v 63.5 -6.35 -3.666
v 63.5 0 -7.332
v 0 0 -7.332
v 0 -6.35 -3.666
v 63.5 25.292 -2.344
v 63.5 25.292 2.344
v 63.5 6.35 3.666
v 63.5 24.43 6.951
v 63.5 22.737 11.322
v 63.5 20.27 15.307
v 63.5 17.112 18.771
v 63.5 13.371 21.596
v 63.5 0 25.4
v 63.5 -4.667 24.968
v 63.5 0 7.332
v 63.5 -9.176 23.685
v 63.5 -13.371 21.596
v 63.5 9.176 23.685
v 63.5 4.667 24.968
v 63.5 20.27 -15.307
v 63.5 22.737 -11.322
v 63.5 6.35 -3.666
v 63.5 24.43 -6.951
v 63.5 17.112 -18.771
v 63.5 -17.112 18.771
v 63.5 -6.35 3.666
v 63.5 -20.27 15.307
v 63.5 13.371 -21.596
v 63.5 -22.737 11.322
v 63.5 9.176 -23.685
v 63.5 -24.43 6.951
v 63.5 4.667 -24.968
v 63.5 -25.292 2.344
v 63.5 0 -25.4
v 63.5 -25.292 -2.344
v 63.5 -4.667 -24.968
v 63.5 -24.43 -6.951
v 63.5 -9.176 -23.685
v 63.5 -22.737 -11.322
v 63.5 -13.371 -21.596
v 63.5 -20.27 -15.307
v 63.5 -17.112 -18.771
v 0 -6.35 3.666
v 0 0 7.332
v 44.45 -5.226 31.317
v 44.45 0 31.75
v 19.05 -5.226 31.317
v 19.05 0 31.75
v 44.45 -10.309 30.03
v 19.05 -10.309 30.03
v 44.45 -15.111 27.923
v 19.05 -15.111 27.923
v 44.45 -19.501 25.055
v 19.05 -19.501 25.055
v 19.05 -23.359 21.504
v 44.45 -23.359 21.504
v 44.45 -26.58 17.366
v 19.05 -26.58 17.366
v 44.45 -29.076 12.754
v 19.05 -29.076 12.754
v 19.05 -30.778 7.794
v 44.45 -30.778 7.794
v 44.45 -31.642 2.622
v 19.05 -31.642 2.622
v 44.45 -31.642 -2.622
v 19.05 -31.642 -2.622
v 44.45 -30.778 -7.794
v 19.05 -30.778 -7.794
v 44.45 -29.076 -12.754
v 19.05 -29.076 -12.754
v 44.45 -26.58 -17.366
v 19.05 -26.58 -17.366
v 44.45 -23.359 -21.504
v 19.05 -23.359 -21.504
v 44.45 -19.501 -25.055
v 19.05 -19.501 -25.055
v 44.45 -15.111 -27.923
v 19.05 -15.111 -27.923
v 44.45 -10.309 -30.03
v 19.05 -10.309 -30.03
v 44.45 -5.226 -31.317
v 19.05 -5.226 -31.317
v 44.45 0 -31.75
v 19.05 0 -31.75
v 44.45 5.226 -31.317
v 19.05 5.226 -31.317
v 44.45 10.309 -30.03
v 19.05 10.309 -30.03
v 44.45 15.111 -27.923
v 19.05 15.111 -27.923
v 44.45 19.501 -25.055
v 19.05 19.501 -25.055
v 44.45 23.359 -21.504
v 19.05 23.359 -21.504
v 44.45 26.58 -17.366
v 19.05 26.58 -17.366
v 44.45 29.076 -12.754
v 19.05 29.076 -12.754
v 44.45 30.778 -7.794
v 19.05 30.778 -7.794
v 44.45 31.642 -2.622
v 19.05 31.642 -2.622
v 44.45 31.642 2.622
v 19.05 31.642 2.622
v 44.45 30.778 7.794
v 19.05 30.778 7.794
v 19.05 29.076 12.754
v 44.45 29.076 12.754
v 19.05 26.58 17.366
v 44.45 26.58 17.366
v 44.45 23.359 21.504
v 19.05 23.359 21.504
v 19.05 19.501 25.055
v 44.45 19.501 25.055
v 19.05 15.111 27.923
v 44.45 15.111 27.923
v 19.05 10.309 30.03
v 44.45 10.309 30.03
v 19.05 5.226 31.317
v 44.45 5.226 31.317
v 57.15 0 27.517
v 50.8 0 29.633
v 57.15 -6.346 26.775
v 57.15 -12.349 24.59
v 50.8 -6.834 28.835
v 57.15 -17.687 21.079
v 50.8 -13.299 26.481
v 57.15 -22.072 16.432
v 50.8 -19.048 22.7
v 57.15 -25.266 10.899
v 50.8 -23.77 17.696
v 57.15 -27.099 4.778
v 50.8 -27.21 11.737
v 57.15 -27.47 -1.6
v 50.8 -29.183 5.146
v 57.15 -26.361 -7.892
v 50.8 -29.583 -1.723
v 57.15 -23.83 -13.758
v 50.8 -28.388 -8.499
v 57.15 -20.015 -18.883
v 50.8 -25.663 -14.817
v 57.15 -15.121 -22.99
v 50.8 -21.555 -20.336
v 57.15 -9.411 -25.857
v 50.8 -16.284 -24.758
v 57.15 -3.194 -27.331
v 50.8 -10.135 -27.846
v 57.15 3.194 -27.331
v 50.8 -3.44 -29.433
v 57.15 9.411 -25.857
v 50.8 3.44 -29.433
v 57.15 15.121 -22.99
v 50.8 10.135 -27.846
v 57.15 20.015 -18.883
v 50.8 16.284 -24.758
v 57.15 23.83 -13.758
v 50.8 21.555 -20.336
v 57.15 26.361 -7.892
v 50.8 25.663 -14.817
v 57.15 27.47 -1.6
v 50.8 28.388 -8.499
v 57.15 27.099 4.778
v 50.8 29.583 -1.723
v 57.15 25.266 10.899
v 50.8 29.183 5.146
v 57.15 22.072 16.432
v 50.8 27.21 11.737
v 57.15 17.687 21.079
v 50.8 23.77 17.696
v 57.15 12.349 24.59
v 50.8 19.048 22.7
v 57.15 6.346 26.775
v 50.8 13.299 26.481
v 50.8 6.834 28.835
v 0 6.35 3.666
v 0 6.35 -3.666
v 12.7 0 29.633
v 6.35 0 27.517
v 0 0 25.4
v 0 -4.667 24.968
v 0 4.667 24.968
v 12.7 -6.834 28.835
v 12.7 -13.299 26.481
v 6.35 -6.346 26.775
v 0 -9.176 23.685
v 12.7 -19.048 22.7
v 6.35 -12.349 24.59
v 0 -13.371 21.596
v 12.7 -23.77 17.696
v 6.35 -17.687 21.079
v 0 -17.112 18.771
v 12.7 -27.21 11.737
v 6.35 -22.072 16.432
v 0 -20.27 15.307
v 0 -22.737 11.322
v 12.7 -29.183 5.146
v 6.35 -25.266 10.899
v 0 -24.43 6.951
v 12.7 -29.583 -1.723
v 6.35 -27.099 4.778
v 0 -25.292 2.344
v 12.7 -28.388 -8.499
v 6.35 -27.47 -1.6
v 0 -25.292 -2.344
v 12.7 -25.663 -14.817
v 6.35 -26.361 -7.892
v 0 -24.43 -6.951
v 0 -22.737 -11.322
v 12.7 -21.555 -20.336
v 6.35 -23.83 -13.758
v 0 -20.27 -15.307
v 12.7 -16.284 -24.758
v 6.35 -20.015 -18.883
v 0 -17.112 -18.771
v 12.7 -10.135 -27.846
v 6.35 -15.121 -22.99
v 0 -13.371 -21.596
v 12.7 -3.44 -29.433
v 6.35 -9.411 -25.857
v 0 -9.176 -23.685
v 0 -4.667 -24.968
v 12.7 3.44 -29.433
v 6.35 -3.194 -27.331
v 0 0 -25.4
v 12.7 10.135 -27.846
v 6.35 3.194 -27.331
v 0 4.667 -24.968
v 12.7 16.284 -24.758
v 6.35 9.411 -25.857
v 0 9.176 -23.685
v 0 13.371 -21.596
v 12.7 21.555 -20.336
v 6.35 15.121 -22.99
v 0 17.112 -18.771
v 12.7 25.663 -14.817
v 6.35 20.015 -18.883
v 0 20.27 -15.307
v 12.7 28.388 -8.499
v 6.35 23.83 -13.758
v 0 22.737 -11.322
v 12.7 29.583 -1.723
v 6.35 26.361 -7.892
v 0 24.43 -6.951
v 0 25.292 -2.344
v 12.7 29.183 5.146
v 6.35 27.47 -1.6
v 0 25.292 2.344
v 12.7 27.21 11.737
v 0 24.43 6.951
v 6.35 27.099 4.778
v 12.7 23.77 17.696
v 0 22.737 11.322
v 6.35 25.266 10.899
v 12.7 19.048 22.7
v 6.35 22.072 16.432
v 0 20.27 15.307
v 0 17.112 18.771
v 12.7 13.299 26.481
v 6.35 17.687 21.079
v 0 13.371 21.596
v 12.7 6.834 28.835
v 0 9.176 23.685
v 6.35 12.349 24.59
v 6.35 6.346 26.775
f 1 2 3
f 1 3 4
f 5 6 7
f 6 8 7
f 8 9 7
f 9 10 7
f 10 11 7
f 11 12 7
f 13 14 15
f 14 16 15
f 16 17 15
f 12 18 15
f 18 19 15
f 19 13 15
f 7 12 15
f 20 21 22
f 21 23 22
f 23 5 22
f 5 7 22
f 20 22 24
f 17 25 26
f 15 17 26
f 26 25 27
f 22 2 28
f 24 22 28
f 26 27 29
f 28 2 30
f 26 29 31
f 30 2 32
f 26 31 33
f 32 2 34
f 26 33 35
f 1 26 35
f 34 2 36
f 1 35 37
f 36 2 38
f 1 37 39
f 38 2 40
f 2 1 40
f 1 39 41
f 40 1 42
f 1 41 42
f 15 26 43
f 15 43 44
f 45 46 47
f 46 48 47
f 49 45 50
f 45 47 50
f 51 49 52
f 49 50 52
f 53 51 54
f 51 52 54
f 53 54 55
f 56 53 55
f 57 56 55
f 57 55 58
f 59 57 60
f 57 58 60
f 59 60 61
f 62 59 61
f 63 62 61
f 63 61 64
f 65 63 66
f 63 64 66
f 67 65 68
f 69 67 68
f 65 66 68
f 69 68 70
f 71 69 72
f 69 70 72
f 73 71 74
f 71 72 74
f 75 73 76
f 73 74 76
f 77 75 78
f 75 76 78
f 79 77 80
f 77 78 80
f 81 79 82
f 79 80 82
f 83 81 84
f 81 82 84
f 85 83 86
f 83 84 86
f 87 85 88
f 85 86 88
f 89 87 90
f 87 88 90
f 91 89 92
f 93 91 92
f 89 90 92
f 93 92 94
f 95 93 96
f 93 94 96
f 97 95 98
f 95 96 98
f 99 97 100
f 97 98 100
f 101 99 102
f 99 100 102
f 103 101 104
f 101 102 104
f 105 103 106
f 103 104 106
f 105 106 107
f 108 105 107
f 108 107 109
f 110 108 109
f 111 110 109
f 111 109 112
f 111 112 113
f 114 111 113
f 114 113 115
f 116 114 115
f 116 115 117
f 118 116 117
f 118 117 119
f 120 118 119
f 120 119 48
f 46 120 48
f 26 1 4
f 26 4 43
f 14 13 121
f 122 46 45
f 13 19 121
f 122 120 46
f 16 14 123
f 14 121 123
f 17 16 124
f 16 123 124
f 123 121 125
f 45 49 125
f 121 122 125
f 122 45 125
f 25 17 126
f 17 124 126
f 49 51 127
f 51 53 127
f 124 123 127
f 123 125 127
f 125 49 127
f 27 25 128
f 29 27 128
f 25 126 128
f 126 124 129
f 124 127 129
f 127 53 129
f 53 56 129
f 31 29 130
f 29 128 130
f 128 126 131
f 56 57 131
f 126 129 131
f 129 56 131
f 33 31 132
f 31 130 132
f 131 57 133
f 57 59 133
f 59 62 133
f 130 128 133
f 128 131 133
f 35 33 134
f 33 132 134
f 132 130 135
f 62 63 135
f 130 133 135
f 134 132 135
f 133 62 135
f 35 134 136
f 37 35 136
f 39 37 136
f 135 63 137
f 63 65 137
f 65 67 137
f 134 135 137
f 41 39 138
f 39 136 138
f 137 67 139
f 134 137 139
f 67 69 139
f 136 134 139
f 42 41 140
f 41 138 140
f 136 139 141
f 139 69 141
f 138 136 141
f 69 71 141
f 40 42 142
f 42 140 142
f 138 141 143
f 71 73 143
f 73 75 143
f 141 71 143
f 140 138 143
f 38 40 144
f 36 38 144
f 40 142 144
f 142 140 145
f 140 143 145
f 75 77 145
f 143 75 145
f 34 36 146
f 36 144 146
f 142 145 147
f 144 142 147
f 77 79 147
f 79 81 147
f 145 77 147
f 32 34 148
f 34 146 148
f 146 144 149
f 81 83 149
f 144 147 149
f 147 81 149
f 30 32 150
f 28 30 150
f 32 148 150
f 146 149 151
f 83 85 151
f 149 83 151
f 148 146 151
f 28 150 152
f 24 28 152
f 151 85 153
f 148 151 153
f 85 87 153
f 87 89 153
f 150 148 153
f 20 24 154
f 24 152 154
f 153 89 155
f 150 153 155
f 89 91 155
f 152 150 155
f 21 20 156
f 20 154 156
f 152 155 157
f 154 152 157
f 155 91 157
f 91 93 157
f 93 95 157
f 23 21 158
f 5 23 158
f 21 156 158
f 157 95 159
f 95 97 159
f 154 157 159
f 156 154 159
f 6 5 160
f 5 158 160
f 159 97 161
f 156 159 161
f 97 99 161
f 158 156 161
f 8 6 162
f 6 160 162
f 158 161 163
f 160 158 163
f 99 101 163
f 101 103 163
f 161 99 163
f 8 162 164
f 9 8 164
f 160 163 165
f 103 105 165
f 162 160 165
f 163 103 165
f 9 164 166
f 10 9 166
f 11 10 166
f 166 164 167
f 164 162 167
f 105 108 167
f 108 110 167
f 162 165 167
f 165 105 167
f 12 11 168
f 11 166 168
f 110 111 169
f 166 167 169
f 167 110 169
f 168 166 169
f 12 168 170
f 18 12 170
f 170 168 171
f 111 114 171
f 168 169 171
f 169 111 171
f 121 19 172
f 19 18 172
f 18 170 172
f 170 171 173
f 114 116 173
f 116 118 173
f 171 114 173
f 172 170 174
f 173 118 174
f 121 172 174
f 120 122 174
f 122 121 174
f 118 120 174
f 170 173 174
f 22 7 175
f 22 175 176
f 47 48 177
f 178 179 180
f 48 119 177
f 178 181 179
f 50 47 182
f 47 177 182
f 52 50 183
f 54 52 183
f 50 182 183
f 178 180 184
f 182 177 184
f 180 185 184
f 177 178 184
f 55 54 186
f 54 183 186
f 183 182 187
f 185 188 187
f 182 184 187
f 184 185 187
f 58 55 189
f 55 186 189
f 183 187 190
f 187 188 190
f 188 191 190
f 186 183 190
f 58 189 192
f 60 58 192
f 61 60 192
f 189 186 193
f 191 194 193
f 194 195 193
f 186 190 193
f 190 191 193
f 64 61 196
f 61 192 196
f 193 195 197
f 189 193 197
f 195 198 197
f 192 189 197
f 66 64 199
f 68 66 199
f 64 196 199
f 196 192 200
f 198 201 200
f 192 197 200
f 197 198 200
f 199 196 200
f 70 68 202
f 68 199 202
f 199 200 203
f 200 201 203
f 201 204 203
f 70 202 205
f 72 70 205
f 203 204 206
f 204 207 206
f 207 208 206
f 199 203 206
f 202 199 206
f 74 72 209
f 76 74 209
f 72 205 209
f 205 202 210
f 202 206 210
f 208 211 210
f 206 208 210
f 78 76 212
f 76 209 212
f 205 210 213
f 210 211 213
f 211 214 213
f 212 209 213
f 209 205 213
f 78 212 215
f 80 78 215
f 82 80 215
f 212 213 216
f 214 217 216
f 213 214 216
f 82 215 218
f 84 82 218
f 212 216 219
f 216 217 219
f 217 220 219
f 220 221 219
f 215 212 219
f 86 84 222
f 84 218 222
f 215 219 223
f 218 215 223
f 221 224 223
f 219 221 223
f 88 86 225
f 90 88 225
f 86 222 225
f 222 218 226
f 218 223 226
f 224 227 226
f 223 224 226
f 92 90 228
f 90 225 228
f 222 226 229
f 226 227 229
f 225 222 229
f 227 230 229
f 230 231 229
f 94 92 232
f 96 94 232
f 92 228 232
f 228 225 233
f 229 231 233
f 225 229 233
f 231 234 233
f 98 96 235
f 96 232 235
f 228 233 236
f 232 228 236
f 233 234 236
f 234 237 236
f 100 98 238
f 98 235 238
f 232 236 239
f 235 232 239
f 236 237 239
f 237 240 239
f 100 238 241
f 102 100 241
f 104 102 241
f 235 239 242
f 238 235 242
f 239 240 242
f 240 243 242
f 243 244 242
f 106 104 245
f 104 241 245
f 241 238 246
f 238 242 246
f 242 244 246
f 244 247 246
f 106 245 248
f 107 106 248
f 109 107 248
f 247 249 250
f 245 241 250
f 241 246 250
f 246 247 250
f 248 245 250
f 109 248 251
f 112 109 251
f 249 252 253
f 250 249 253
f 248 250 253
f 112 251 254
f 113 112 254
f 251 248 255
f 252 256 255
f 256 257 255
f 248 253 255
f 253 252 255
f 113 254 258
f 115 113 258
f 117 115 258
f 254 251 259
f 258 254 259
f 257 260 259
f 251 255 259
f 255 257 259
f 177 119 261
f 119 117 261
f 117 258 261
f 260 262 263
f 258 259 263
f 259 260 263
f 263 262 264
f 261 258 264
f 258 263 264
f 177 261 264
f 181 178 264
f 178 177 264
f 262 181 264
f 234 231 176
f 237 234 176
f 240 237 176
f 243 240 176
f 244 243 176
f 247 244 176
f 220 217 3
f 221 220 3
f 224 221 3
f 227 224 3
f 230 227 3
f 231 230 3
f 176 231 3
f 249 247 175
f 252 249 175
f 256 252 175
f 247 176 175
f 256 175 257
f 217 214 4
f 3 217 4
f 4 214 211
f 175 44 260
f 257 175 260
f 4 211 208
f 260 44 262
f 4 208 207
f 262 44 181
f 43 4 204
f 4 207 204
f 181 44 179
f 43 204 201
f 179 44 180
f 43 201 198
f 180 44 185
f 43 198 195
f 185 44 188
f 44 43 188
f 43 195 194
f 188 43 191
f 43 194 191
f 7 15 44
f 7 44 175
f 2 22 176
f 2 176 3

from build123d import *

# Parameters (mm, degrees)
CUT_EXTRUDE1_DEPTH      = 78.771299333
CUT_EXTRUDE1_DEPTH_BACK = 78.771299333


with BuildPart() as part:
    # Sketch1 → Revolve1 (revolve)
    with BuildSketch(Plane.XY, mode=Mode.PRIVATE) as revolve1_sk:
        Polygon((0, 0), (63.5, 0), (63.5, 25.4), (44.45, 31.75), (19.05, 31.75), (0, 25.4), align=None)
    revolve(revolve1_sk.sketch.rotate(Axis((0, 0, 0), (1, 0, 0)), 90), axis=Axis((0, 0, 0), (1, 0, 0)))

    # Sketch2 → Cut-Extrude1 (cut, two sides: drawn at the far end of the back side and taken through both)
    with BuildSketch(Plane.ZY.offset(-CUT_EXTRUDE1_DEPTH_BACK)):
        Polygon((-3.666174209, 6.35), (-7.332348419, 0), (-3.666174209, -6.35), (3.666174209, -6.35), (7.332348419, 0), (3.666174209, 6.35), align=None)
    extrude(amount=CUT_EXTRUDE1_DEPTH + CUT_EXTRUDE1_DEPTH_BACK, mode=Mode.SUBTRACT)


solid = part.part
